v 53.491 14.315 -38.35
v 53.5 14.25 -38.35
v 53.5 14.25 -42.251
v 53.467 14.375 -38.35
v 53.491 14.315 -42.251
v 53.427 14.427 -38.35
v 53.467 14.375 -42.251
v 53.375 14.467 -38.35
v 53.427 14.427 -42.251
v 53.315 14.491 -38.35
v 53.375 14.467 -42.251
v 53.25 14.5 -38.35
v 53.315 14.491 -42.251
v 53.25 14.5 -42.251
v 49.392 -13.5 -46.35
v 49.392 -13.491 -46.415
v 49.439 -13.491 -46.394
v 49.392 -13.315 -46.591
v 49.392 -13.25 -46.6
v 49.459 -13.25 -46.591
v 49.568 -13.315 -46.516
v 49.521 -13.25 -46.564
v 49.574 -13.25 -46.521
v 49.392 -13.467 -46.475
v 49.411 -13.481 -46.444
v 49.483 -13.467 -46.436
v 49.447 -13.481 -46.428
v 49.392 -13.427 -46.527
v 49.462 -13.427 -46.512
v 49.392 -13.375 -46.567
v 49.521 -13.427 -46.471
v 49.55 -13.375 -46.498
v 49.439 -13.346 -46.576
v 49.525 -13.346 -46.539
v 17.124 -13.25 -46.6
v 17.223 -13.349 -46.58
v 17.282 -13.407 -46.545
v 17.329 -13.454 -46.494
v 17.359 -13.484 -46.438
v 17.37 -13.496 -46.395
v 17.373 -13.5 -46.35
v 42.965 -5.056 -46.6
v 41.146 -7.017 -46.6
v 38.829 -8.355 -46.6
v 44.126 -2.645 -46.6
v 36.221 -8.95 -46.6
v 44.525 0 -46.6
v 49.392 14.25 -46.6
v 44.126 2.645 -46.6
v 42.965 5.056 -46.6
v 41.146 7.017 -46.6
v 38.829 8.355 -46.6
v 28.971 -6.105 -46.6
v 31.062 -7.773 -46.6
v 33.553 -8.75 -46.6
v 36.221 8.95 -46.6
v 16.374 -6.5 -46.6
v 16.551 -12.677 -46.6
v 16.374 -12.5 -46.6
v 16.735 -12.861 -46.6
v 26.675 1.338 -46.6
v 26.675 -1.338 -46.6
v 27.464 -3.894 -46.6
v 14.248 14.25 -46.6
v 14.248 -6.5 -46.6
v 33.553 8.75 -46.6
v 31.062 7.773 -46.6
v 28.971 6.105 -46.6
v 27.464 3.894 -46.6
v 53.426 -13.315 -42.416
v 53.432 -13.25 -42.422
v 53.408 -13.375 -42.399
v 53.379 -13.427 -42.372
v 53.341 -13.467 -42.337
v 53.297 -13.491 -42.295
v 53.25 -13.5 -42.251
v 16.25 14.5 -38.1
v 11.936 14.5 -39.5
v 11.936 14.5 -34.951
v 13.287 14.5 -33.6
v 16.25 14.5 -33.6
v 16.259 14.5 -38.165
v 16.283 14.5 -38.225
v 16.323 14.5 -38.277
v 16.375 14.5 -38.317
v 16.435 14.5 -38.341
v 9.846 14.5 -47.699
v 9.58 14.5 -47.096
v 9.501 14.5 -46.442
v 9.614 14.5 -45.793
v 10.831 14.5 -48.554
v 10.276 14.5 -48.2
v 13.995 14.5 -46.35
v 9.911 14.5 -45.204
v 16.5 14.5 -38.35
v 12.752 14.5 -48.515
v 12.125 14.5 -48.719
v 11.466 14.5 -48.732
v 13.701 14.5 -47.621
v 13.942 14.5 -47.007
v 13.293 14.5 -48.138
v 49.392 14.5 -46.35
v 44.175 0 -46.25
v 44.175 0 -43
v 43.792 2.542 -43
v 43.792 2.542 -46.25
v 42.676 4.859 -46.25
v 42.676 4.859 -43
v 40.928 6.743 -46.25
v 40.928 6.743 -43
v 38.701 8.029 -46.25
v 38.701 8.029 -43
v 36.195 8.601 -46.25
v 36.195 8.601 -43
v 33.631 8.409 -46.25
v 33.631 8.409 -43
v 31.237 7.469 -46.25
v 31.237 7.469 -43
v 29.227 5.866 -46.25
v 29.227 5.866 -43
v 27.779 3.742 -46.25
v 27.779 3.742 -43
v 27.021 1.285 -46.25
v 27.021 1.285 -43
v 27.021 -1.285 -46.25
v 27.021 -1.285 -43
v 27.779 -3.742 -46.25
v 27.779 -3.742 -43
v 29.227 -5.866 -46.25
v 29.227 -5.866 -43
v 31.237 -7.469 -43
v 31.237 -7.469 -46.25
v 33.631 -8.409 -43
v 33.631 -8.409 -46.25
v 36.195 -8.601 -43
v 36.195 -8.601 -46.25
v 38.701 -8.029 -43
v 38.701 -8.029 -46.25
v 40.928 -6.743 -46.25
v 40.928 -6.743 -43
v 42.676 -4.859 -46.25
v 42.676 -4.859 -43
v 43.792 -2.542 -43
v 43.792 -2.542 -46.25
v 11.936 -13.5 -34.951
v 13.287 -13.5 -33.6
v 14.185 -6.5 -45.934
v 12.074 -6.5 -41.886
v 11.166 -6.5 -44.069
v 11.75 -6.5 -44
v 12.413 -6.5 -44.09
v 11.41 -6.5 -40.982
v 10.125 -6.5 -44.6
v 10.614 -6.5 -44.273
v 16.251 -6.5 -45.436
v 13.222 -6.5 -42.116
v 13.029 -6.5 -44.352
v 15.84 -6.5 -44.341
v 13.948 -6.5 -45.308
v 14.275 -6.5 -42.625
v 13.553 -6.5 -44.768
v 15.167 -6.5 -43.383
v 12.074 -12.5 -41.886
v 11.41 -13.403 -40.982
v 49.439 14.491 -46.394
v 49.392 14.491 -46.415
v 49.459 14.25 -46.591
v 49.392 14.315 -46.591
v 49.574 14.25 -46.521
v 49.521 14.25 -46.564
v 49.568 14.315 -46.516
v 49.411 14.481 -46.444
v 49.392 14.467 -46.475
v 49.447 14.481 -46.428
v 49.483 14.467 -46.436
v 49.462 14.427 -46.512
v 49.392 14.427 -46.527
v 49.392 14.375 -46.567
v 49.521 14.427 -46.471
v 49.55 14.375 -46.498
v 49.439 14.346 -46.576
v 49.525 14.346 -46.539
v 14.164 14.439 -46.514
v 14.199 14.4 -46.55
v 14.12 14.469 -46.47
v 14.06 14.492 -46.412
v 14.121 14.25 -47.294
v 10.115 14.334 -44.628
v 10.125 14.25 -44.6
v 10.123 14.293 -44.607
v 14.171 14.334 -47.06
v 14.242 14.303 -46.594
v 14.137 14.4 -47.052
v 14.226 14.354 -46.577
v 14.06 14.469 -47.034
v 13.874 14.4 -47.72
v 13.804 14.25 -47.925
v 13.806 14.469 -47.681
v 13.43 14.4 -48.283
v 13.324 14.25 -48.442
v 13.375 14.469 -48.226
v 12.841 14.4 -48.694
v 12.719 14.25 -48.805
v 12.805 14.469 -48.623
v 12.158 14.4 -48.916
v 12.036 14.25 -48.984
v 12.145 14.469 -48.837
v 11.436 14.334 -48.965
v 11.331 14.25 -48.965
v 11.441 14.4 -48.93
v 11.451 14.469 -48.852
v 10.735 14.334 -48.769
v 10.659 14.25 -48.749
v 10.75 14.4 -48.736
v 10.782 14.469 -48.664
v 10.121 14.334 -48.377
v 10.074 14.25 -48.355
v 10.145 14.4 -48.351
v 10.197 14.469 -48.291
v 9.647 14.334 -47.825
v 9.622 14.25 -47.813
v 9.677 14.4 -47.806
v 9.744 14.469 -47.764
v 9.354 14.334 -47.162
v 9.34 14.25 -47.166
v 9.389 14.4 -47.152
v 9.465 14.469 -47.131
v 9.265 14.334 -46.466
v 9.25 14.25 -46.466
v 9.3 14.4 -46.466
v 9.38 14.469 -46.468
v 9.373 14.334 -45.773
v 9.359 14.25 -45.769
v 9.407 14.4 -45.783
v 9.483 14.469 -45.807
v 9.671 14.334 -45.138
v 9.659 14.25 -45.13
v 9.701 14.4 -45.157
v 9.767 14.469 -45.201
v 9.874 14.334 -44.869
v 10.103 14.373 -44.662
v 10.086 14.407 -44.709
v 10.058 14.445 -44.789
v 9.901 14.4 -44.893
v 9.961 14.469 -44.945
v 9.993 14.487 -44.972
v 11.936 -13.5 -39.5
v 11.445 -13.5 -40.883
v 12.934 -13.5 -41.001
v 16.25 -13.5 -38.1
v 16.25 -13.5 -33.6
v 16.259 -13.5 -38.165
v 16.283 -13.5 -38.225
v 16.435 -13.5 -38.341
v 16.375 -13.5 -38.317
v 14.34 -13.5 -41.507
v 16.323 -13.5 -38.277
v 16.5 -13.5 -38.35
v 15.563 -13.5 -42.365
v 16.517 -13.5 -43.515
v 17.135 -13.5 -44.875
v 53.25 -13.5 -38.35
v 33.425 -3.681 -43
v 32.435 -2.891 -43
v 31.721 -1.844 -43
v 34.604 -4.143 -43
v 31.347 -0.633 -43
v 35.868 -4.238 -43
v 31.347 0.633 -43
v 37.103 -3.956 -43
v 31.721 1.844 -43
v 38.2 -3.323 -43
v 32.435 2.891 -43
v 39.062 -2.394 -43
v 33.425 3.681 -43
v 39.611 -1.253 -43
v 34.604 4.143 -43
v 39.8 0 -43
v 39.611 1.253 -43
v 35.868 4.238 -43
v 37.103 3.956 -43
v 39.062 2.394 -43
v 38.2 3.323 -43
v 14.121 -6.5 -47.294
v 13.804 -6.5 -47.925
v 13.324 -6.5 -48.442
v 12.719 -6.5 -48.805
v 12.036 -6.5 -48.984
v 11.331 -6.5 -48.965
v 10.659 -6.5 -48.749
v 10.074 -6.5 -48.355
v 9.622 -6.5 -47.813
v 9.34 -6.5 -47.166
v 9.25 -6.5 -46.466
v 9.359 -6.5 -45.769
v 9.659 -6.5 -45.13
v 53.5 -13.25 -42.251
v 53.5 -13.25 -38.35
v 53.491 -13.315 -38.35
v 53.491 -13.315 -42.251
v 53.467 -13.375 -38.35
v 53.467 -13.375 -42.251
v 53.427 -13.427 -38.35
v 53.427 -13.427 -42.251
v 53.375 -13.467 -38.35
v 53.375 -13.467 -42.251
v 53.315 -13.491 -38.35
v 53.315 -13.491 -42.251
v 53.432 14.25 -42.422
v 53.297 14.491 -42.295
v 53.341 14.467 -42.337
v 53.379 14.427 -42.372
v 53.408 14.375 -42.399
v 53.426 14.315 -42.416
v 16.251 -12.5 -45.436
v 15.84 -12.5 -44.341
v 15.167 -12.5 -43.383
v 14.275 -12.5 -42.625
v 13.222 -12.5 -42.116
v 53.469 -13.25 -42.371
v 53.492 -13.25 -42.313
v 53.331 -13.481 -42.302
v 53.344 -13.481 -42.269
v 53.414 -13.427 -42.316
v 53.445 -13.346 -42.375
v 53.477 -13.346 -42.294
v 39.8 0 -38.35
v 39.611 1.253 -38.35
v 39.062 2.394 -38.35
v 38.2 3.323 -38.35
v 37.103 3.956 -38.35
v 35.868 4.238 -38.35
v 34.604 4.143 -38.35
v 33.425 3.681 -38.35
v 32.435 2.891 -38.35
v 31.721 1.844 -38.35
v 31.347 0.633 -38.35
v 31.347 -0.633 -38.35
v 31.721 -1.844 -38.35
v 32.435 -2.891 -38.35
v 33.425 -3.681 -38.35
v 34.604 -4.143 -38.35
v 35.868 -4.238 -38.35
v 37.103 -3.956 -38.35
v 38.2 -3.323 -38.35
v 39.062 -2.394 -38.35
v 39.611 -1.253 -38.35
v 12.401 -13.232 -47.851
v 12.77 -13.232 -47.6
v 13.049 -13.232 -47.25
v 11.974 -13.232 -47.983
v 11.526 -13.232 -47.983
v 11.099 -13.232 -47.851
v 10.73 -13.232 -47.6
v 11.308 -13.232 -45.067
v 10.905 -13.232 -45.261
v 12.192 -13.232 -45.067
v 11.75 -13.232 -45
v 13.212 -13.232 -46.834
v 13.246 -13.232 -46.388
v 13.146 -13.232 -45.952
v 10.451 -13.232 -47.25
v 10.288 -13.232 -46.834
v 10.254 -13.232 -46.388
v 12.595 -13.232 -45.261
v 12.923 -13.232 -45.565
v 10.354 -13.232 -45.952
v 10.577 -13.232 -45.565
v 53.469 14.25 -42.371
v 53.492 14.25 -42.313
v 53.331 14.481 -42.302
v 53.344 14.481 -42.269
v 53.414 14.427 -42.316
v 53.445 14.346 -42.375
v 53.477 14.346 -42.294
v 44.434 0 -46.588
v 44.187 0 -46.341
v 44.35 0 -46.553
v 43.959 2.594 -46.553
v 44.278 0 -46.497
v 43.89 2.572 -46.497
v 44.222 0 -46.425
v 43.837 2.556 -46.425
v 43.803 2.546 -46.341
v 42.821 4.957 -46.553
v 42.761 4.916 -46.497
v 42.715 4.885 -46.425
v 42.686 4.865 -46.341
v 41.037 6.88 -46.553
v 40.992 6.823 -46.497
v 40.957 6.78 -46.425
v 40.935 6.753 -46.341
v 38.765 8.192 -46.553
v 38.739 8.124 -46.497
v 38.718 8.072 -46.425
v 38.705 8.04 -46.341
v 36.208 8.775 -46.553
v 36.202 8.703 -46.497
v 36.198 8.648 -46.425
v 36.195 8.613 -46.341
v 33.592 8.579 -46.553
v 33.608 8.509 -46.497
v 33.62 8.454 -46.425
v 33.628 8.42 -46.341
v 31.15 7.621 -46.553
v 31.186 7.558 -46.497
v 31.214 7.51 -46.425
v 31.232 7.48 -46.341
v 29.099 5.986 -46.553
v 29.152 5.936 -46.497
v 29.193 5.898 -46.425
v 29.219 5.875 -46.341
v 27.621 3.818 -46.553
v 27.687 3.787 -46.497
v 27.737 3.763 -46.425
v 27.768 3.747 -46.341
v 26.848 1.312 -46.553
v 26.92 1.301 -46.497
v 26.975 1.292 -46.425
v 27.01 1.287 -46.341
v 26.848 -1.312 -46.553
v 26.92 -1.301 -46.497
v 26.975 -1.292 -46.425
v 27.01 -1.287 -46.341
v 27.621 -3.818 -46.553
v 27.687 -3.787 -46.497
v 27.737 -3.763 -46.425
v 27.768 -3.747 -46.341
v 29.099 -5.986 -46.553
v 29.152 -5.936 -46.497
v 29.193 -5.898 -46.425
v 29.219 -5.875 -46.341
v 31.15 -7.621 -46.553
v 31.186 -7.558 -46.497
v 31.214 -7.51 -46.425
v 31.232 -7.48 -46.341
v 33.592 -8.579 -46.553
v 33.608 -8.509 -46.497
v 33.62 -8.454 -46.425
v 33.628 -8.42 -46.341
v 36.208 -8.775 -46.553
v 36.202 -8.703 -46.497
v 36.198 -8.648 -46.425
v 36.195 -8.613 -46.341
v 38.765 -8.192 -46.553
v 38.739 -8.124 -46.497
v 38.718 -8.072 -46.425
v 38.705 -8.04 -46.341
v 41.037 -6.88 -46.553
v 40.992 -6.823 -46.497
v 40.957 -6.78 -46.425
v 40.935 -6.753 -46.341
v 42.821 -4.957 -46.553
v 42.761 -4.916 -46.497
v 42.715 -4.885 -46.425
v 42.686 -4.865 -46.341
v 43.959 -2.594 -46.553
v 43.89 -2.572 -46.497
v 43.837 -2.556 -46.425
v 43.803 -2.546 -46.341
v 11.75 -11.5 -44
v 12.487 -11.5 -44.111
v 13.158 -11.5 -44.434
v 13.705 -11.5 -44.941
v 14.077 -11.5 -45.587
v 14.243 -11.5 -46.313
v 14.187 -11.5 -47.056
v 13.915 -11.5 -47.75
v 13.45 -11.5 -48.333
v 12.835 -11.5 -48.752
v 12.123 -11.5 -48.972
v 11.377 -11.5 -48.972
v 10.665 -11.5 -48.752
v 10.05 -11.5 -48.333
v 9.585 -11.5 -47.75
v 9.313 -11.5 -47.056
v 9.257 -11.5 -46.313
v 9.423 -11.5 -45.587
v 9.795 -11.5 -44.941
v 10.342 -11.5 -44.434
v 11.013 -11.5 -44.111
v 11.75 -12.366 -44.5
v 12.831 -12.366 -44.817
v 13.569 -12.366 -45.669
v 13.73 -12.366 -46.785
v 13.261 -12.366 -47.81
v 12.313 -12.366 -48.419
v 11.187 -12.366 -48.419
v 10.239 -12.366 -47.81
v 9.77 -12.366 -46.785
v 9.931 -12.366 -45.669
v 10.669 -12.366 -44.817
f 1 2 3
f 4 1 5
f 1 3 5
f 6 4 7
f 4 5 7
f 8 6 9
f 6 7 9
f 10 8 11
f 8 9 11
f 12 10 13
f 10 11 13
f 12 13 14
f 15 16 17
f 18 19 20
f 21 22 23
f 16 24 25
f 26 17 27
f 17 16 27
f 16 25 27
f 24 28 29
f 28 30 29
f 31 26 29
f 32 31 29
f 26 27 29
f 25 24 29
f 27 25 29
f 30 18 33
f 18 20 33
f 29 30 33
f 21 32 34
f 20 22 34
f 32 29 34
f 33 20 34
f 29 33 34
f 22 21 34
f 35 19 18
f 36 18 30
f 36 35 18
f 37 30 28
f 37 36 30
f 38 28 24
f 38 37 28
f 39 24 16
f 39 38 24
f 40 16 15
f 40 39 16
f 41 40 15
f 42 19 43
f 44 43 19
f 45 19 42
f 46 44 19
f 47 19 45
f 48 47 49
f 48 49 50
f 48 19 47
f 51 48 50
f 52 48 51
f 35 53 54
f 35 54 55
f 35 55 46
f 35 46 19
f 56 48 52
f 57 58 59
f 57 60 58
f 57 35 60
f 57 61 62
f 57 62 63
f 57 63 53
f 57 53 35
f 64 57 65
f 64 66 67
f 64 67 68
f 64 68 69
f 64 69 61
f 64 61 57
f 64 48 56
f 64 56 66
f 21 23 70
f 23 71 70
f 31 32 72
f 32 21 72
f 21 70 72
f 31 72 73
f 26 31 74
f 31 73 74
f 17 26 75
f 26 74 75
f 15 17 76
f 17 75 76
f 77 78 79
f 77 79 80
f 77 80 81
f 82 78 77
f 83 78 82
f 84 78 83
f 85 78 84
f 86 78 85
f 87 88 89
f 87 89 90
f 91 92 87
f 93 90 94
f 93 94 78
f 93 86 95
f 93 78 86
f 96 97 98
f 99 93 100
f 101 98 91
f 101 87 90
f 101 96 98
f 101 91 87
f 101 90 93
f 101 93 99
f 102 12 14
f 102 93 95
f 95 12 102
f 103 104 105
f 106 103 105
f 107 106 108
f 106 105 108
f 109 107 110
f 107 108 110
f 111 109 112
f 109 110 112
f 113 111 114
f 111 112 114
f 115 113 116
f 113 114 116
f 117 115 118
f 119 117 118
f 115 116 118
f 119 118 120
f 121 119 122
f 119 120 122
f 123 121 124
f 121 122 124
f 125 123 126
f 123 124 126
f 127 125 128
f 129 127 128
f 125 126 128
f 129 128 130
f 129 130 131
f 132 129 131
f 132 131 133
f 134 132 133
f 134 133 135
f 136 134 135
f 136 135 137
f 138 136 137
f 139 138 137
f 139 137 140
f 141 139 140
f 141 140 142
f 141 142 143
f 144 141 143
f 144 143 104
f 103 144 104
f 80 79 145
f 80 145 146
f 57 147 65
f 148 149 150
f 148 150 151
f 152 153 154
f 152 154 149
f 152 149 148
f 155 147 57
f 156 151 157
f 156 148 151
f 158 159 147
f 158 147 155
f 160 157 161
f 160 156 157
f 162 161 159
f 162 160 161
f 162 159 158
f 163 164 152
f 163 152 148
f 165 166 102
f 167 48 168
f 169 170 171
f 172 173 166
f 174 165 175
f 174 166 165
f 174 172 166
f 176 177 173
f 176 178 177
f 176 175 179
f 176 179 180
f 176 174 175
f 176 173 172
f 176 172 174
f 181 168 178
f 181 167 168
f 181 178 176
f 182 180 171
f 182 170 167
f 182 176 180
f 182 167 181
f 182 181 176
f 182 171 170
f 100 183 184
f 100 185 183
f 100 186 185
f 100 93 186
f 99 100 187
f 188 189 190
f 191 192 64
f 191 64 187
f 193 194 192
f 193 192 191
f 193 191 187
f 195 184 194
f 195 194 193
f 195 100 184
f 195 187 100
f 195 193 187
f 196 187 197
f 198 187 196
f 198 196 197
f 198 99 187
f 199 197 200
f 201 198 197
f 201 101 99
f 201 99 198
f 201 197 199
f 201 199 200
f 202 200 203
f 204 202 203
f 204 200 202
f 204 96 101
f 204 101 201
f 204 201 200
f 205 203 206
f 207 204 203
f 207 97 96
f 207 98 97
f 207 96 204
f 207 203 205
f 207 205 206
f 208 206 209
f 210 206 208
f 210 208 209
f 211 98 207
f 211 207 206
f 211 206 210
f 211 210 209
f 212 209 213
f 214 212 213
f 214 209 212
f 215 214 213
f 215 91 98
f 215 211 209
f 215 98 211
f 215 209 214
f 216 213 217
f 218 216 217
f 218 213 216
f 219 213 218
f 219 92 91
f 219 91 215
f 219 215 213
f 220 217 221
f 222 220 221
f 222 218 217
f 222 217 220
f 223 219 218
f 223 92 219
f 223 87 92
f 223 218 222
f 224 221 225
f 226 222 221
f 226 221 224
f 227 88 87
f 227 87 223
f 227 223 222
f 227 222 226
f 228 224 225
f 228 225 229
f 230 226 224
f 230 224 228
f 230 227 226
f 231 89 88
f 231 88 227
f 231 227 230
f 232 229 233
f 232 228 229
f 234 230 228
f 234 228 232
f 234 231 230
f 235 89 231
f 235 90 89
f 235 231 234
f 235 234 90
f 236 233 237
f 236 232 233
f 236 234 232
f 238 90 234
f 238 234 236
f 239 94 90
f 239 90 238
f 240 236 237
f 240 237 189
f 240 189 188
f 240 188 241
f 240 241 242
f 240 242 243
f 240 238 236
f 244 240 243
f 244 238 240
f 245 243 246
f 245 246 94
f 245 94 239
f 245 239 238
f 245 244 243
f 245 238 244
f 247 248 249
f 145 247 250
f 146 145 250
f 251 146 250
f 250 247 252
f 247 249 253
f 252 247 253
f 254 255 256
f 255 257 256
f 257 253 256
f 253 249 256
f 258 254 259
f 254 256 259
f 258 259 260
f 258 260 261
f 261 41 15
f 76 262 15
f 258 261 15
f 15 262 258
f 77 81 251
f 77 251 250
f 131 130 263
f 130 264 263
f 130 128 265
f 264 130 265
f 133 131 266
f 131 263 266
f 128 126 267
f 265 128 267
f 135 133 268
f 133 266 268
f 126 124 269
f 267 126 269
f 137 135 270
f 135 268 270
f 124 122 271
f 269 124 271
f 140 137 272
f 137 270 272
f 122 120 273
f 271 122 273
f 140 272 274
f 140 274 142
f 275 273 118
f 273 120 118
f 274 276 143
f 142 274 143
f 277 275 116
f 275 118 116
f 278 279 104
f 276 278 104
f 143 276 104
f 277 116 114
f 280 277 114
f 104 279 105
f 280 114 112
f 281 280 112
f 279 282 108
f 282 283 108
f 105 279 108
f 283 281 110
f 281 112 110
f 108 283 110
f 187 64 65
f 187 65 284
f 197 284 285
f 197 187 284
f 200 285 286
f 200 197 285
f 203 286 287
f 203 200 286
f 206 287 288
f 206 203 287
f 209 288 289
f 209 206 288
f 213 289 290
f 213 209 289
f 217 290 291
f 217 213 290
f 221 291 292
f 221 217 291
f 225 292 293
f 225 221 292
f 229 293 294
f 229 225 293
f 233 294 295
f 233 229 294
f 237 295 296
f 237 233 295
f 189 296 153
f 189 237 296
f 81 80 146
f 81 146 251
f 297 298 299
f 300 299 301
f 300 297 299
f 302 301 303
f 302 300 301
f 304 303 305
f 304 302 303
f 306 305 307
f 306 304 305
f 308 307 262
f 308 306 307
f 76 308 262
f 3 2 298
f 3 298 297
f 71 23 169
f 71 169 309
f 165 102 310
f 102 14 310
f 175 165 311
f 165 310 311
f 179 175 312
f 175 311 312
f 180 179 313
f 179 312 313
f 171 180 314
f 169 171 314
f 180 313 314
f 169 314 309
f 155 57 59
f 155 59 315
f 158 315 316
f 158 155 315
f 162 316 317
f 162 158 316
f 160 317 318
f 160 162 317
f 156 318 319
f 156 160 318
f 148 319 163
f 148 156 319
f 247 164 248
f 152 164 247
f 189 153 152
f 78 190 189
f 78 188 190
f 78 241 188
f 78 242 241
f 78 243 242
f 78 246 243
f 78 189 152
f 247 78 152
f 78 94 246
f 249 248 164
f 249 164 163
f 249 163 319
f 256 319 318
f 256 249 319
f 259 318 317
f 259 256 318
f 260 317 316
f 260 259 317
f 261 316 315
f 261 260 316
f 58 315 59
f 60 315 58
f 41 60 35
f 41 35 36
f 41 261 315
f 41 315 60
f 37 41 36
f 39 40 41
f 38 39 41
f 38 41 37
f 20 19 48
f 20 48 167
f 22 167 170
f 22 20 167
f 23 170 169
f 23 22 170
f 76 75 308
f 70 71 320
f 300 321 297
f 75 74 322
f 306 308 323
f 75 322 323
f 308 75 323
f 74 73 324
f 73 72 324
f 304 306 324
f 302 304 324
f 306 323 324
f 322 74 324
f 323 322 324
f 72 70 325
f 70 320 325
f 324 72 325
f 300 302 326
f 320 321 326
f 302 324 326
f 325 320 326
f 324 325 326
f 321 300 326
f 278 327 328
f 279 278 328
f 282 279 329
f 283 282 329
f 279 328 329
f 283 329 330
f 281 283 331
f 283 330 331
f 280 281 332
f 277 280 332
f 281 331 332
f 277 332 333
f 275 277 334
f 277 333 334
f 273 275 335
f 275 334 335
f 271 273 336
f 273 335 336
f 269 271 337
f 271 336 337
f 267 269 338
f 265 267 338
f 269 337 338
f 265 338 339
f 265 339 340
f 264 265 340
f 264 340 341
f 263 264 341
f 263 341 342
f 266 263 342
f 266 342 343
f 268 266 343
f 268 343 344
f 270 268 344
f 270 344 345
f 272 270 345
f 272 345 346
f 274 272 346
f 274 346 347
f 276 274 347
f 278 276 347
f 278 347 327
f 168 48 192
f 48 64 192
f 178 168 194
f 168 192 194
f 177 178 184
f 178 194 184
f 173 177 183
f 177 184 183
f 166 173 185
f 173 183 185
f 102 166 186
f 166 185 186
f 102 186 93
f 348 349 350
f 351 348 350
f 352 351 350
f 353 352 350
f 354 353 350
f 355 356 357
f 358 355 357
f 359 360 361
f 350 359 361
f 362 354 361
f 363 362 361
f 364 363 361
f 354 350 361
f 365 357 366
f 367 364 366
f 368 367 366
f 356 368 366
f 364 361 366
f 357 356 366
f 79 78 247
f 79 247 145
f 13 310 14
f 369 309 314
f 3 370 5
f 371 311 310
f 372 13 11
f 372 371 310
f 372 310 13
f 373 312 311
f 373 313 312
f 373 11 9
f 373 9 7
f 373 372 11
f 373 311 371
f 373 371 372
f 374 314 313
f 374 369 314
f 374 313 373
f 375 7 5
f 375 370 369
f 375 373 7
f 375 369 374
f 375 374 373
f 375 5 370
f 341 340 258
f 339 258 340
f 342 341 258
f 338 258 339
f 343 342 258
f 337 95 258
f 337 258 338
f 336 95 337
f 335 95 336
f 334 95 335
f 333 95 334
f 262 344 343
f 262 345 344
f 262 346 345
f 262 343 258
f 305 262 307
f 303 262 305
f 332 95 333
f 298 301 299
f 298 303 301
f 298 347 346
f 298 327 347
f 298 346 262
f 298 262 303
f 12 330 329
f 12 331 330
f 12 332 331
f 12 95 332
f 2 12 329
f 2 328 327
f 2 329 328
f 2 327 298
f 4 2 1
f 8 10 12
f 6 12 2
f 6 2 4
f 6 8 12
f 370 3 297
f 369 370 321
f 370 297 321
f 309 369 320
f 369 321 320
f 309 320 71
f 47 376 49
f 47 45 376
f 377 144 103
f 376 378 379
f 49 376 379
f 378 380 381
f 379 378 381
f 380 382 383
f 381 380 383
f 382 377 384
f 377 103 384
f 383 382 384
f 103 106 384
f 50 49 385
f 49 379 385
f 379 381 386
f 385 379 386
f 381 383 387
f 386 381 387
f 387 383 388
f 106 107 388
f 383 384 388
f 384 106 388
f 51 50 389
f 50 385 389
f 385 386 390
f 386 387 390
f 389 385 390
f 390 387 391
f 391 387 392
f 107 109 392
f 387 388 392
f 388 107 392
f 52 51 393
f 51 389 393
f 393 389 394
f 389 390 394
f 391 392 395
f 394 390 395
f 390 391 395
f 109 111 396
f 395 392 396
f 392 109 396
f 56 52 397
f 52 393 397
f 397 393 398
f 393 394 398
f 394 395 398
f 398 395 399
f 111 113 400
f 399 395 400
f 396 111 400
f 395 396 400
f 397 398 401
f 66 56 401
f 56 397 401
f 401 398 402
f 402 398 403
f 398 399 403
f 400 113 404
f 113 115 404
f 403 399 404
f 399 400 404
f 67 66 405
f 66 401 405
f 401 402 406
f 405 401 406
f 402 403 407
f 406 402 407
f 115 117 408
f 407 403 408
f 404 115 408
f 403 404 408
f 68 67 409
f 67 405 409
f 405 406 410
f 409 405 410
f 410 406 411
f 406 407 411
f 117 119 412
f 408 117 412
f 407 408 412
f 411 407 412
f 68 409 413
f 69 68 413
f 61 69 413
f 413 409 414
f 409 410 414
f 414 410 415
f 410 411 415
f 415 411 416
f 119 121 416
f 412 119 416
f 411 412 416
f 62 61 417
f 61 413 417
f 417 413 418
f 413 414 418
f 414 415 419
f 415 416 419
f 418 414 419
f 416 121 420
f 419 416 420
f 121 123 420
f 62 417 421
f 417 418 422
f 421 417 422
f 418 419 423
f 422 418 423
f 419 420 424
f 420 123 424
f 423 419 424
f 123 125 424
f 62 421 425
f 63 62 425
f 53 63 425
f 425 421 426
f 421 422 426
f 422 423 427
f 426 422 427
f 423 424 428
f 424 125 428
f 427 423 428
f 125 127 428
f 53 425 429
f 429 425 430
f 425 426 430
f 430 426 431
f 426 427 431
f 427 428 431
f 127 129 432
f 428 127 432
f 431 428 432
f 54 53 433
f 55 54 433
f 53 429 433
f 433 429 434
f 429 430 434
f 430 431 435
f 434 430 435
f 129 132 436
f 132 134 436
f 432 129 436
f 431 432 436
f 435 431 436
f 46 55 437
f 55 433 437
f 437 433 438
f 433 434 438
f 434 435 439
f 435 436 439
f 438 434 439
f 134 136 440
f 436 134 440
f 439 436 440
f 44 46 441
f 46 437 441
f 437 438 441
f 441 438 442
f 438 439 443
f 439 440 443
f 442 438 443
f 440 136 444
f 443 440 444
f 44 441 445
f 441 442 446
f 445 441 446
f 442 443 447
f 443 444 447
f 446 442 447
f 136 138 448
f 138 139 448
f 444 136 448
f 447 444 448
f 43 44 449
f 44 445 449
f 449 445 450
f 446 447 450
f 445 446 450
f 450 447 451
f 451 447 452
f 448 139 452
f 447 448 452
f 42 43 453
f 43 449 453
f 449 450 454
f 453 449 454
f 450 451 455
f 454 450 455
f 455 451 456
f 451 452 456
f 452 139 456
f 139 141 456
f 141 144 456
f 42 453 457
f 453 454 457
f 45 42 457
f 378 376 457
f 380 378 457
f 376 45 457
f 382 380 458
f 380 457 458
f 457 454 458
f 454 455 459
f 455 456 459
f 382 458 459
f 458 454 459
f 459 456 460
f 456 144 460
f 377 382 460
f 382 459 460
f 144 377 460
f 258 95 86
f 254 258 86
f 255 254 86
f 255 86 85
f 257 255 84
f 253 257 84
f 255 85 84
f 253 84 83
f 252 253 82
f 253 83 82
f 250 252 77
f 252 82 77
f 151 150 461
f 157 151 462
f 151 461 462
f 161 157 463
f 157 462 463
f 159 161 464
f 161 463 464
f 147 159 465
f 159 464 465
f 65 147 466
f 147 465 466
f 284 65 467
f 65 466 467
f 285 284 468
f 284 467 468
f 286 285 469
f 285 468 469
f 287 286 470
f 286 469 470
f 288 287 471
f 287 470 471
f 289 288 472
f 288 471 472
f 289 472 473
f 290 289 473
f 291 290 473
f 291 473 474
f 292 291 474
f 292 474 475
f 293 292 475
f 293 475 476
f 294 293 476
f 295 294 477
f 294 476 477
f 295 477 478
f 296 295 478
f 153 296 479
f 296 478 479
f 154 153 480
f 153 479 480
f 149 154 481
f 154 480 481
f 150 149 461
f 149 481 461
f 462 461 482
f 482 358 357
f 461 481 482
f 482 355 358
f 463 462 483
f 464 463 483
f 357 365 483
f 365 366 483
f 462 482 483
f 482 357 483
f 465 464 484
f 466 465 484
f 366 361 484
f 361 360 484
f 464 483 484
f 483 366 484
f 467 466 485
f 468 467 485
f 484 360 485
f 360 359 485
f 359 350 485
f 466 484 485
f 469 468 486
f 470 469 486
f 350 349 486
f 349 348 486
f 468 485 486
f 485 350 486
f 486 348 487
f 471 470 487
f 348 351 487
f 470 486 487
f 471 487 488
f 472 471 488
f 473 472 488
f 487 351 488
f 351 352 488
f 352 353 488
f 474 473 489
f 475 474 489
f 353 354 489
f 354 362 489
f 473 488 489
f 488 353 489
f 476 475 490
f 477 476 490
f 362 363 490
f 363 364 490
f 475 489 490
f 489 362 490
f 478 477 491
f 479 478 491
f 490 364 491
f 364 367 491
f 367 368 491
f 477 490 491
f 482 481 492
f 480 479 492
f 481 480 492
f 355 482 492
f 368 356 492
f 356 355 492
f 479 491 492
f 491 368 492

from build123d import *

# Parameters (mm, degrees)
PAD007_DEPTH    = 28
SKETCH013_R     = 4.625
POCKET004_DEPTH = 7
SKETCH015_R     = 4.25
POCKET005_DEPTH = 49.001
SKETCH016_R     = 8.625
POCKET006_DEPTH = 4
CHAMFER_SIZE    = 1
FILLET007_R     = 0.25
FILLET008_R     = 0.35


with BuildPart() as part:
    # Sketch012 → Pad007 (new body)
    with BuildSketch(Plane(origin=(16, 14.5, -38.1), x_dir=(1, 0, 0), z_dir=(0, 1, 0))):
        with BuildLine():
            Line((0.5, 0.25), (37.5, 0.25))
            Line((37.5, 0.25), (37.5, 4.25))
            Line((33.5, 8.5), (37.5, 4.25))
            Line((33.5, 8.5), (-1.752001, 8.5))
            ThreePointArc((-1.752001, 8.5), (-5.341153, 10.649307), (-5.874808, 6.5))
            Line((-5.874808, 6.5), (-4.064, 1.4))
            Line((-4.064, 1.4), (-4.064, -3.148735))
            Line((-4.064, -3.148735), (-2.712735, -4.5))
            Line((-2.712735, -4.5), (0.25, -4.5))
            Line((0.25, -4.5), (0.25, 0))
            ThreePointArc((0.5, 0.25), (0.323223, 0.176777), (0.25, 0))
        make_face()
    extrude(amount=-PAD007_DEPTH)

    # Sketch013 → Pocket004 (cut)
    with BuildSketch(Plane.XZ.offset(6.5)):
        with Locations((11.75, -46.5)):
            Circle(SKETCH013_R)
    extrude(amount=POCKET004_DEPTH, mode=Mode.SUBTRACT)

    # Sketch014 → Revolution001 (revolve)
    with BuildSketch(Plane(origin=(11.75, -6.5, -46.5), x_dir=(0, 1, 0), z_dir=(1, 0, 0))):
        Polygon((-6.732051, 1.5), (-6.732051, 0), (0, 0), (0, 2.5), (-5, 2.5), align=None)
    revolve(axis=Axis((11.75, -6.5, -46.5), (0, 1, 0)))

    # Sketch015 → Pocket005 (cut, through all)
    with BuildSketch(Plane.XY):
        with Locations((35.55, 0)):
            Circle(SKETCH015_R)
    extrude(amount=-POCKET005_DEPTH, mode=Mode.SUBTRACT)

    # Sketch016 → Pocket006 (cut)
    with BuildSketch(Plane.XY.offset(-43)):
        with Locations((35.55, 0)):
            Circle(SKETCH016_R)
    extrude(amount=-POCKET006_DEPTH, mode=Mode.SUBTRACT)

    # Chamfer
    chamfer_edges = [part.edges().sort_by_distance(p)[0] for p in [
        (14.772373, -13.5, -42.999159),
        (11.075157, -10, -41.924499),
    ]]
    chamfer(chamfer_edges, length=CHAMFER_SIZE)

    # Fillet007
    fillet007_edges = [part.edges().sort_by_distance(p)[0] for p in [
        (33.437056, -13.5, -46.6),
        (51.5, -13.5, -44.475),
        (53.5, -13.5, -40.35),
        (53.5, 14.5, -40.35),
        (53.5, 0.5, -42.35),
        (51.5, 14.5, -44.475),
        (49.5, 0.5, -46.6),
        (31.874, 14.5, -46.6),
        (10.658847, 14.5, -48.749307),
    ]]
    fillet(fillet007_edges, radius=FILLET007_R)

    # Fillet008
    fillet008_edges = [part.edges().sort_by_distance(p)[0] for p in [
        (26.925, 0, -46.6),
    ]]
    fillet(fillet008_edges, radius=FILLET008_R)


solid = part.part
